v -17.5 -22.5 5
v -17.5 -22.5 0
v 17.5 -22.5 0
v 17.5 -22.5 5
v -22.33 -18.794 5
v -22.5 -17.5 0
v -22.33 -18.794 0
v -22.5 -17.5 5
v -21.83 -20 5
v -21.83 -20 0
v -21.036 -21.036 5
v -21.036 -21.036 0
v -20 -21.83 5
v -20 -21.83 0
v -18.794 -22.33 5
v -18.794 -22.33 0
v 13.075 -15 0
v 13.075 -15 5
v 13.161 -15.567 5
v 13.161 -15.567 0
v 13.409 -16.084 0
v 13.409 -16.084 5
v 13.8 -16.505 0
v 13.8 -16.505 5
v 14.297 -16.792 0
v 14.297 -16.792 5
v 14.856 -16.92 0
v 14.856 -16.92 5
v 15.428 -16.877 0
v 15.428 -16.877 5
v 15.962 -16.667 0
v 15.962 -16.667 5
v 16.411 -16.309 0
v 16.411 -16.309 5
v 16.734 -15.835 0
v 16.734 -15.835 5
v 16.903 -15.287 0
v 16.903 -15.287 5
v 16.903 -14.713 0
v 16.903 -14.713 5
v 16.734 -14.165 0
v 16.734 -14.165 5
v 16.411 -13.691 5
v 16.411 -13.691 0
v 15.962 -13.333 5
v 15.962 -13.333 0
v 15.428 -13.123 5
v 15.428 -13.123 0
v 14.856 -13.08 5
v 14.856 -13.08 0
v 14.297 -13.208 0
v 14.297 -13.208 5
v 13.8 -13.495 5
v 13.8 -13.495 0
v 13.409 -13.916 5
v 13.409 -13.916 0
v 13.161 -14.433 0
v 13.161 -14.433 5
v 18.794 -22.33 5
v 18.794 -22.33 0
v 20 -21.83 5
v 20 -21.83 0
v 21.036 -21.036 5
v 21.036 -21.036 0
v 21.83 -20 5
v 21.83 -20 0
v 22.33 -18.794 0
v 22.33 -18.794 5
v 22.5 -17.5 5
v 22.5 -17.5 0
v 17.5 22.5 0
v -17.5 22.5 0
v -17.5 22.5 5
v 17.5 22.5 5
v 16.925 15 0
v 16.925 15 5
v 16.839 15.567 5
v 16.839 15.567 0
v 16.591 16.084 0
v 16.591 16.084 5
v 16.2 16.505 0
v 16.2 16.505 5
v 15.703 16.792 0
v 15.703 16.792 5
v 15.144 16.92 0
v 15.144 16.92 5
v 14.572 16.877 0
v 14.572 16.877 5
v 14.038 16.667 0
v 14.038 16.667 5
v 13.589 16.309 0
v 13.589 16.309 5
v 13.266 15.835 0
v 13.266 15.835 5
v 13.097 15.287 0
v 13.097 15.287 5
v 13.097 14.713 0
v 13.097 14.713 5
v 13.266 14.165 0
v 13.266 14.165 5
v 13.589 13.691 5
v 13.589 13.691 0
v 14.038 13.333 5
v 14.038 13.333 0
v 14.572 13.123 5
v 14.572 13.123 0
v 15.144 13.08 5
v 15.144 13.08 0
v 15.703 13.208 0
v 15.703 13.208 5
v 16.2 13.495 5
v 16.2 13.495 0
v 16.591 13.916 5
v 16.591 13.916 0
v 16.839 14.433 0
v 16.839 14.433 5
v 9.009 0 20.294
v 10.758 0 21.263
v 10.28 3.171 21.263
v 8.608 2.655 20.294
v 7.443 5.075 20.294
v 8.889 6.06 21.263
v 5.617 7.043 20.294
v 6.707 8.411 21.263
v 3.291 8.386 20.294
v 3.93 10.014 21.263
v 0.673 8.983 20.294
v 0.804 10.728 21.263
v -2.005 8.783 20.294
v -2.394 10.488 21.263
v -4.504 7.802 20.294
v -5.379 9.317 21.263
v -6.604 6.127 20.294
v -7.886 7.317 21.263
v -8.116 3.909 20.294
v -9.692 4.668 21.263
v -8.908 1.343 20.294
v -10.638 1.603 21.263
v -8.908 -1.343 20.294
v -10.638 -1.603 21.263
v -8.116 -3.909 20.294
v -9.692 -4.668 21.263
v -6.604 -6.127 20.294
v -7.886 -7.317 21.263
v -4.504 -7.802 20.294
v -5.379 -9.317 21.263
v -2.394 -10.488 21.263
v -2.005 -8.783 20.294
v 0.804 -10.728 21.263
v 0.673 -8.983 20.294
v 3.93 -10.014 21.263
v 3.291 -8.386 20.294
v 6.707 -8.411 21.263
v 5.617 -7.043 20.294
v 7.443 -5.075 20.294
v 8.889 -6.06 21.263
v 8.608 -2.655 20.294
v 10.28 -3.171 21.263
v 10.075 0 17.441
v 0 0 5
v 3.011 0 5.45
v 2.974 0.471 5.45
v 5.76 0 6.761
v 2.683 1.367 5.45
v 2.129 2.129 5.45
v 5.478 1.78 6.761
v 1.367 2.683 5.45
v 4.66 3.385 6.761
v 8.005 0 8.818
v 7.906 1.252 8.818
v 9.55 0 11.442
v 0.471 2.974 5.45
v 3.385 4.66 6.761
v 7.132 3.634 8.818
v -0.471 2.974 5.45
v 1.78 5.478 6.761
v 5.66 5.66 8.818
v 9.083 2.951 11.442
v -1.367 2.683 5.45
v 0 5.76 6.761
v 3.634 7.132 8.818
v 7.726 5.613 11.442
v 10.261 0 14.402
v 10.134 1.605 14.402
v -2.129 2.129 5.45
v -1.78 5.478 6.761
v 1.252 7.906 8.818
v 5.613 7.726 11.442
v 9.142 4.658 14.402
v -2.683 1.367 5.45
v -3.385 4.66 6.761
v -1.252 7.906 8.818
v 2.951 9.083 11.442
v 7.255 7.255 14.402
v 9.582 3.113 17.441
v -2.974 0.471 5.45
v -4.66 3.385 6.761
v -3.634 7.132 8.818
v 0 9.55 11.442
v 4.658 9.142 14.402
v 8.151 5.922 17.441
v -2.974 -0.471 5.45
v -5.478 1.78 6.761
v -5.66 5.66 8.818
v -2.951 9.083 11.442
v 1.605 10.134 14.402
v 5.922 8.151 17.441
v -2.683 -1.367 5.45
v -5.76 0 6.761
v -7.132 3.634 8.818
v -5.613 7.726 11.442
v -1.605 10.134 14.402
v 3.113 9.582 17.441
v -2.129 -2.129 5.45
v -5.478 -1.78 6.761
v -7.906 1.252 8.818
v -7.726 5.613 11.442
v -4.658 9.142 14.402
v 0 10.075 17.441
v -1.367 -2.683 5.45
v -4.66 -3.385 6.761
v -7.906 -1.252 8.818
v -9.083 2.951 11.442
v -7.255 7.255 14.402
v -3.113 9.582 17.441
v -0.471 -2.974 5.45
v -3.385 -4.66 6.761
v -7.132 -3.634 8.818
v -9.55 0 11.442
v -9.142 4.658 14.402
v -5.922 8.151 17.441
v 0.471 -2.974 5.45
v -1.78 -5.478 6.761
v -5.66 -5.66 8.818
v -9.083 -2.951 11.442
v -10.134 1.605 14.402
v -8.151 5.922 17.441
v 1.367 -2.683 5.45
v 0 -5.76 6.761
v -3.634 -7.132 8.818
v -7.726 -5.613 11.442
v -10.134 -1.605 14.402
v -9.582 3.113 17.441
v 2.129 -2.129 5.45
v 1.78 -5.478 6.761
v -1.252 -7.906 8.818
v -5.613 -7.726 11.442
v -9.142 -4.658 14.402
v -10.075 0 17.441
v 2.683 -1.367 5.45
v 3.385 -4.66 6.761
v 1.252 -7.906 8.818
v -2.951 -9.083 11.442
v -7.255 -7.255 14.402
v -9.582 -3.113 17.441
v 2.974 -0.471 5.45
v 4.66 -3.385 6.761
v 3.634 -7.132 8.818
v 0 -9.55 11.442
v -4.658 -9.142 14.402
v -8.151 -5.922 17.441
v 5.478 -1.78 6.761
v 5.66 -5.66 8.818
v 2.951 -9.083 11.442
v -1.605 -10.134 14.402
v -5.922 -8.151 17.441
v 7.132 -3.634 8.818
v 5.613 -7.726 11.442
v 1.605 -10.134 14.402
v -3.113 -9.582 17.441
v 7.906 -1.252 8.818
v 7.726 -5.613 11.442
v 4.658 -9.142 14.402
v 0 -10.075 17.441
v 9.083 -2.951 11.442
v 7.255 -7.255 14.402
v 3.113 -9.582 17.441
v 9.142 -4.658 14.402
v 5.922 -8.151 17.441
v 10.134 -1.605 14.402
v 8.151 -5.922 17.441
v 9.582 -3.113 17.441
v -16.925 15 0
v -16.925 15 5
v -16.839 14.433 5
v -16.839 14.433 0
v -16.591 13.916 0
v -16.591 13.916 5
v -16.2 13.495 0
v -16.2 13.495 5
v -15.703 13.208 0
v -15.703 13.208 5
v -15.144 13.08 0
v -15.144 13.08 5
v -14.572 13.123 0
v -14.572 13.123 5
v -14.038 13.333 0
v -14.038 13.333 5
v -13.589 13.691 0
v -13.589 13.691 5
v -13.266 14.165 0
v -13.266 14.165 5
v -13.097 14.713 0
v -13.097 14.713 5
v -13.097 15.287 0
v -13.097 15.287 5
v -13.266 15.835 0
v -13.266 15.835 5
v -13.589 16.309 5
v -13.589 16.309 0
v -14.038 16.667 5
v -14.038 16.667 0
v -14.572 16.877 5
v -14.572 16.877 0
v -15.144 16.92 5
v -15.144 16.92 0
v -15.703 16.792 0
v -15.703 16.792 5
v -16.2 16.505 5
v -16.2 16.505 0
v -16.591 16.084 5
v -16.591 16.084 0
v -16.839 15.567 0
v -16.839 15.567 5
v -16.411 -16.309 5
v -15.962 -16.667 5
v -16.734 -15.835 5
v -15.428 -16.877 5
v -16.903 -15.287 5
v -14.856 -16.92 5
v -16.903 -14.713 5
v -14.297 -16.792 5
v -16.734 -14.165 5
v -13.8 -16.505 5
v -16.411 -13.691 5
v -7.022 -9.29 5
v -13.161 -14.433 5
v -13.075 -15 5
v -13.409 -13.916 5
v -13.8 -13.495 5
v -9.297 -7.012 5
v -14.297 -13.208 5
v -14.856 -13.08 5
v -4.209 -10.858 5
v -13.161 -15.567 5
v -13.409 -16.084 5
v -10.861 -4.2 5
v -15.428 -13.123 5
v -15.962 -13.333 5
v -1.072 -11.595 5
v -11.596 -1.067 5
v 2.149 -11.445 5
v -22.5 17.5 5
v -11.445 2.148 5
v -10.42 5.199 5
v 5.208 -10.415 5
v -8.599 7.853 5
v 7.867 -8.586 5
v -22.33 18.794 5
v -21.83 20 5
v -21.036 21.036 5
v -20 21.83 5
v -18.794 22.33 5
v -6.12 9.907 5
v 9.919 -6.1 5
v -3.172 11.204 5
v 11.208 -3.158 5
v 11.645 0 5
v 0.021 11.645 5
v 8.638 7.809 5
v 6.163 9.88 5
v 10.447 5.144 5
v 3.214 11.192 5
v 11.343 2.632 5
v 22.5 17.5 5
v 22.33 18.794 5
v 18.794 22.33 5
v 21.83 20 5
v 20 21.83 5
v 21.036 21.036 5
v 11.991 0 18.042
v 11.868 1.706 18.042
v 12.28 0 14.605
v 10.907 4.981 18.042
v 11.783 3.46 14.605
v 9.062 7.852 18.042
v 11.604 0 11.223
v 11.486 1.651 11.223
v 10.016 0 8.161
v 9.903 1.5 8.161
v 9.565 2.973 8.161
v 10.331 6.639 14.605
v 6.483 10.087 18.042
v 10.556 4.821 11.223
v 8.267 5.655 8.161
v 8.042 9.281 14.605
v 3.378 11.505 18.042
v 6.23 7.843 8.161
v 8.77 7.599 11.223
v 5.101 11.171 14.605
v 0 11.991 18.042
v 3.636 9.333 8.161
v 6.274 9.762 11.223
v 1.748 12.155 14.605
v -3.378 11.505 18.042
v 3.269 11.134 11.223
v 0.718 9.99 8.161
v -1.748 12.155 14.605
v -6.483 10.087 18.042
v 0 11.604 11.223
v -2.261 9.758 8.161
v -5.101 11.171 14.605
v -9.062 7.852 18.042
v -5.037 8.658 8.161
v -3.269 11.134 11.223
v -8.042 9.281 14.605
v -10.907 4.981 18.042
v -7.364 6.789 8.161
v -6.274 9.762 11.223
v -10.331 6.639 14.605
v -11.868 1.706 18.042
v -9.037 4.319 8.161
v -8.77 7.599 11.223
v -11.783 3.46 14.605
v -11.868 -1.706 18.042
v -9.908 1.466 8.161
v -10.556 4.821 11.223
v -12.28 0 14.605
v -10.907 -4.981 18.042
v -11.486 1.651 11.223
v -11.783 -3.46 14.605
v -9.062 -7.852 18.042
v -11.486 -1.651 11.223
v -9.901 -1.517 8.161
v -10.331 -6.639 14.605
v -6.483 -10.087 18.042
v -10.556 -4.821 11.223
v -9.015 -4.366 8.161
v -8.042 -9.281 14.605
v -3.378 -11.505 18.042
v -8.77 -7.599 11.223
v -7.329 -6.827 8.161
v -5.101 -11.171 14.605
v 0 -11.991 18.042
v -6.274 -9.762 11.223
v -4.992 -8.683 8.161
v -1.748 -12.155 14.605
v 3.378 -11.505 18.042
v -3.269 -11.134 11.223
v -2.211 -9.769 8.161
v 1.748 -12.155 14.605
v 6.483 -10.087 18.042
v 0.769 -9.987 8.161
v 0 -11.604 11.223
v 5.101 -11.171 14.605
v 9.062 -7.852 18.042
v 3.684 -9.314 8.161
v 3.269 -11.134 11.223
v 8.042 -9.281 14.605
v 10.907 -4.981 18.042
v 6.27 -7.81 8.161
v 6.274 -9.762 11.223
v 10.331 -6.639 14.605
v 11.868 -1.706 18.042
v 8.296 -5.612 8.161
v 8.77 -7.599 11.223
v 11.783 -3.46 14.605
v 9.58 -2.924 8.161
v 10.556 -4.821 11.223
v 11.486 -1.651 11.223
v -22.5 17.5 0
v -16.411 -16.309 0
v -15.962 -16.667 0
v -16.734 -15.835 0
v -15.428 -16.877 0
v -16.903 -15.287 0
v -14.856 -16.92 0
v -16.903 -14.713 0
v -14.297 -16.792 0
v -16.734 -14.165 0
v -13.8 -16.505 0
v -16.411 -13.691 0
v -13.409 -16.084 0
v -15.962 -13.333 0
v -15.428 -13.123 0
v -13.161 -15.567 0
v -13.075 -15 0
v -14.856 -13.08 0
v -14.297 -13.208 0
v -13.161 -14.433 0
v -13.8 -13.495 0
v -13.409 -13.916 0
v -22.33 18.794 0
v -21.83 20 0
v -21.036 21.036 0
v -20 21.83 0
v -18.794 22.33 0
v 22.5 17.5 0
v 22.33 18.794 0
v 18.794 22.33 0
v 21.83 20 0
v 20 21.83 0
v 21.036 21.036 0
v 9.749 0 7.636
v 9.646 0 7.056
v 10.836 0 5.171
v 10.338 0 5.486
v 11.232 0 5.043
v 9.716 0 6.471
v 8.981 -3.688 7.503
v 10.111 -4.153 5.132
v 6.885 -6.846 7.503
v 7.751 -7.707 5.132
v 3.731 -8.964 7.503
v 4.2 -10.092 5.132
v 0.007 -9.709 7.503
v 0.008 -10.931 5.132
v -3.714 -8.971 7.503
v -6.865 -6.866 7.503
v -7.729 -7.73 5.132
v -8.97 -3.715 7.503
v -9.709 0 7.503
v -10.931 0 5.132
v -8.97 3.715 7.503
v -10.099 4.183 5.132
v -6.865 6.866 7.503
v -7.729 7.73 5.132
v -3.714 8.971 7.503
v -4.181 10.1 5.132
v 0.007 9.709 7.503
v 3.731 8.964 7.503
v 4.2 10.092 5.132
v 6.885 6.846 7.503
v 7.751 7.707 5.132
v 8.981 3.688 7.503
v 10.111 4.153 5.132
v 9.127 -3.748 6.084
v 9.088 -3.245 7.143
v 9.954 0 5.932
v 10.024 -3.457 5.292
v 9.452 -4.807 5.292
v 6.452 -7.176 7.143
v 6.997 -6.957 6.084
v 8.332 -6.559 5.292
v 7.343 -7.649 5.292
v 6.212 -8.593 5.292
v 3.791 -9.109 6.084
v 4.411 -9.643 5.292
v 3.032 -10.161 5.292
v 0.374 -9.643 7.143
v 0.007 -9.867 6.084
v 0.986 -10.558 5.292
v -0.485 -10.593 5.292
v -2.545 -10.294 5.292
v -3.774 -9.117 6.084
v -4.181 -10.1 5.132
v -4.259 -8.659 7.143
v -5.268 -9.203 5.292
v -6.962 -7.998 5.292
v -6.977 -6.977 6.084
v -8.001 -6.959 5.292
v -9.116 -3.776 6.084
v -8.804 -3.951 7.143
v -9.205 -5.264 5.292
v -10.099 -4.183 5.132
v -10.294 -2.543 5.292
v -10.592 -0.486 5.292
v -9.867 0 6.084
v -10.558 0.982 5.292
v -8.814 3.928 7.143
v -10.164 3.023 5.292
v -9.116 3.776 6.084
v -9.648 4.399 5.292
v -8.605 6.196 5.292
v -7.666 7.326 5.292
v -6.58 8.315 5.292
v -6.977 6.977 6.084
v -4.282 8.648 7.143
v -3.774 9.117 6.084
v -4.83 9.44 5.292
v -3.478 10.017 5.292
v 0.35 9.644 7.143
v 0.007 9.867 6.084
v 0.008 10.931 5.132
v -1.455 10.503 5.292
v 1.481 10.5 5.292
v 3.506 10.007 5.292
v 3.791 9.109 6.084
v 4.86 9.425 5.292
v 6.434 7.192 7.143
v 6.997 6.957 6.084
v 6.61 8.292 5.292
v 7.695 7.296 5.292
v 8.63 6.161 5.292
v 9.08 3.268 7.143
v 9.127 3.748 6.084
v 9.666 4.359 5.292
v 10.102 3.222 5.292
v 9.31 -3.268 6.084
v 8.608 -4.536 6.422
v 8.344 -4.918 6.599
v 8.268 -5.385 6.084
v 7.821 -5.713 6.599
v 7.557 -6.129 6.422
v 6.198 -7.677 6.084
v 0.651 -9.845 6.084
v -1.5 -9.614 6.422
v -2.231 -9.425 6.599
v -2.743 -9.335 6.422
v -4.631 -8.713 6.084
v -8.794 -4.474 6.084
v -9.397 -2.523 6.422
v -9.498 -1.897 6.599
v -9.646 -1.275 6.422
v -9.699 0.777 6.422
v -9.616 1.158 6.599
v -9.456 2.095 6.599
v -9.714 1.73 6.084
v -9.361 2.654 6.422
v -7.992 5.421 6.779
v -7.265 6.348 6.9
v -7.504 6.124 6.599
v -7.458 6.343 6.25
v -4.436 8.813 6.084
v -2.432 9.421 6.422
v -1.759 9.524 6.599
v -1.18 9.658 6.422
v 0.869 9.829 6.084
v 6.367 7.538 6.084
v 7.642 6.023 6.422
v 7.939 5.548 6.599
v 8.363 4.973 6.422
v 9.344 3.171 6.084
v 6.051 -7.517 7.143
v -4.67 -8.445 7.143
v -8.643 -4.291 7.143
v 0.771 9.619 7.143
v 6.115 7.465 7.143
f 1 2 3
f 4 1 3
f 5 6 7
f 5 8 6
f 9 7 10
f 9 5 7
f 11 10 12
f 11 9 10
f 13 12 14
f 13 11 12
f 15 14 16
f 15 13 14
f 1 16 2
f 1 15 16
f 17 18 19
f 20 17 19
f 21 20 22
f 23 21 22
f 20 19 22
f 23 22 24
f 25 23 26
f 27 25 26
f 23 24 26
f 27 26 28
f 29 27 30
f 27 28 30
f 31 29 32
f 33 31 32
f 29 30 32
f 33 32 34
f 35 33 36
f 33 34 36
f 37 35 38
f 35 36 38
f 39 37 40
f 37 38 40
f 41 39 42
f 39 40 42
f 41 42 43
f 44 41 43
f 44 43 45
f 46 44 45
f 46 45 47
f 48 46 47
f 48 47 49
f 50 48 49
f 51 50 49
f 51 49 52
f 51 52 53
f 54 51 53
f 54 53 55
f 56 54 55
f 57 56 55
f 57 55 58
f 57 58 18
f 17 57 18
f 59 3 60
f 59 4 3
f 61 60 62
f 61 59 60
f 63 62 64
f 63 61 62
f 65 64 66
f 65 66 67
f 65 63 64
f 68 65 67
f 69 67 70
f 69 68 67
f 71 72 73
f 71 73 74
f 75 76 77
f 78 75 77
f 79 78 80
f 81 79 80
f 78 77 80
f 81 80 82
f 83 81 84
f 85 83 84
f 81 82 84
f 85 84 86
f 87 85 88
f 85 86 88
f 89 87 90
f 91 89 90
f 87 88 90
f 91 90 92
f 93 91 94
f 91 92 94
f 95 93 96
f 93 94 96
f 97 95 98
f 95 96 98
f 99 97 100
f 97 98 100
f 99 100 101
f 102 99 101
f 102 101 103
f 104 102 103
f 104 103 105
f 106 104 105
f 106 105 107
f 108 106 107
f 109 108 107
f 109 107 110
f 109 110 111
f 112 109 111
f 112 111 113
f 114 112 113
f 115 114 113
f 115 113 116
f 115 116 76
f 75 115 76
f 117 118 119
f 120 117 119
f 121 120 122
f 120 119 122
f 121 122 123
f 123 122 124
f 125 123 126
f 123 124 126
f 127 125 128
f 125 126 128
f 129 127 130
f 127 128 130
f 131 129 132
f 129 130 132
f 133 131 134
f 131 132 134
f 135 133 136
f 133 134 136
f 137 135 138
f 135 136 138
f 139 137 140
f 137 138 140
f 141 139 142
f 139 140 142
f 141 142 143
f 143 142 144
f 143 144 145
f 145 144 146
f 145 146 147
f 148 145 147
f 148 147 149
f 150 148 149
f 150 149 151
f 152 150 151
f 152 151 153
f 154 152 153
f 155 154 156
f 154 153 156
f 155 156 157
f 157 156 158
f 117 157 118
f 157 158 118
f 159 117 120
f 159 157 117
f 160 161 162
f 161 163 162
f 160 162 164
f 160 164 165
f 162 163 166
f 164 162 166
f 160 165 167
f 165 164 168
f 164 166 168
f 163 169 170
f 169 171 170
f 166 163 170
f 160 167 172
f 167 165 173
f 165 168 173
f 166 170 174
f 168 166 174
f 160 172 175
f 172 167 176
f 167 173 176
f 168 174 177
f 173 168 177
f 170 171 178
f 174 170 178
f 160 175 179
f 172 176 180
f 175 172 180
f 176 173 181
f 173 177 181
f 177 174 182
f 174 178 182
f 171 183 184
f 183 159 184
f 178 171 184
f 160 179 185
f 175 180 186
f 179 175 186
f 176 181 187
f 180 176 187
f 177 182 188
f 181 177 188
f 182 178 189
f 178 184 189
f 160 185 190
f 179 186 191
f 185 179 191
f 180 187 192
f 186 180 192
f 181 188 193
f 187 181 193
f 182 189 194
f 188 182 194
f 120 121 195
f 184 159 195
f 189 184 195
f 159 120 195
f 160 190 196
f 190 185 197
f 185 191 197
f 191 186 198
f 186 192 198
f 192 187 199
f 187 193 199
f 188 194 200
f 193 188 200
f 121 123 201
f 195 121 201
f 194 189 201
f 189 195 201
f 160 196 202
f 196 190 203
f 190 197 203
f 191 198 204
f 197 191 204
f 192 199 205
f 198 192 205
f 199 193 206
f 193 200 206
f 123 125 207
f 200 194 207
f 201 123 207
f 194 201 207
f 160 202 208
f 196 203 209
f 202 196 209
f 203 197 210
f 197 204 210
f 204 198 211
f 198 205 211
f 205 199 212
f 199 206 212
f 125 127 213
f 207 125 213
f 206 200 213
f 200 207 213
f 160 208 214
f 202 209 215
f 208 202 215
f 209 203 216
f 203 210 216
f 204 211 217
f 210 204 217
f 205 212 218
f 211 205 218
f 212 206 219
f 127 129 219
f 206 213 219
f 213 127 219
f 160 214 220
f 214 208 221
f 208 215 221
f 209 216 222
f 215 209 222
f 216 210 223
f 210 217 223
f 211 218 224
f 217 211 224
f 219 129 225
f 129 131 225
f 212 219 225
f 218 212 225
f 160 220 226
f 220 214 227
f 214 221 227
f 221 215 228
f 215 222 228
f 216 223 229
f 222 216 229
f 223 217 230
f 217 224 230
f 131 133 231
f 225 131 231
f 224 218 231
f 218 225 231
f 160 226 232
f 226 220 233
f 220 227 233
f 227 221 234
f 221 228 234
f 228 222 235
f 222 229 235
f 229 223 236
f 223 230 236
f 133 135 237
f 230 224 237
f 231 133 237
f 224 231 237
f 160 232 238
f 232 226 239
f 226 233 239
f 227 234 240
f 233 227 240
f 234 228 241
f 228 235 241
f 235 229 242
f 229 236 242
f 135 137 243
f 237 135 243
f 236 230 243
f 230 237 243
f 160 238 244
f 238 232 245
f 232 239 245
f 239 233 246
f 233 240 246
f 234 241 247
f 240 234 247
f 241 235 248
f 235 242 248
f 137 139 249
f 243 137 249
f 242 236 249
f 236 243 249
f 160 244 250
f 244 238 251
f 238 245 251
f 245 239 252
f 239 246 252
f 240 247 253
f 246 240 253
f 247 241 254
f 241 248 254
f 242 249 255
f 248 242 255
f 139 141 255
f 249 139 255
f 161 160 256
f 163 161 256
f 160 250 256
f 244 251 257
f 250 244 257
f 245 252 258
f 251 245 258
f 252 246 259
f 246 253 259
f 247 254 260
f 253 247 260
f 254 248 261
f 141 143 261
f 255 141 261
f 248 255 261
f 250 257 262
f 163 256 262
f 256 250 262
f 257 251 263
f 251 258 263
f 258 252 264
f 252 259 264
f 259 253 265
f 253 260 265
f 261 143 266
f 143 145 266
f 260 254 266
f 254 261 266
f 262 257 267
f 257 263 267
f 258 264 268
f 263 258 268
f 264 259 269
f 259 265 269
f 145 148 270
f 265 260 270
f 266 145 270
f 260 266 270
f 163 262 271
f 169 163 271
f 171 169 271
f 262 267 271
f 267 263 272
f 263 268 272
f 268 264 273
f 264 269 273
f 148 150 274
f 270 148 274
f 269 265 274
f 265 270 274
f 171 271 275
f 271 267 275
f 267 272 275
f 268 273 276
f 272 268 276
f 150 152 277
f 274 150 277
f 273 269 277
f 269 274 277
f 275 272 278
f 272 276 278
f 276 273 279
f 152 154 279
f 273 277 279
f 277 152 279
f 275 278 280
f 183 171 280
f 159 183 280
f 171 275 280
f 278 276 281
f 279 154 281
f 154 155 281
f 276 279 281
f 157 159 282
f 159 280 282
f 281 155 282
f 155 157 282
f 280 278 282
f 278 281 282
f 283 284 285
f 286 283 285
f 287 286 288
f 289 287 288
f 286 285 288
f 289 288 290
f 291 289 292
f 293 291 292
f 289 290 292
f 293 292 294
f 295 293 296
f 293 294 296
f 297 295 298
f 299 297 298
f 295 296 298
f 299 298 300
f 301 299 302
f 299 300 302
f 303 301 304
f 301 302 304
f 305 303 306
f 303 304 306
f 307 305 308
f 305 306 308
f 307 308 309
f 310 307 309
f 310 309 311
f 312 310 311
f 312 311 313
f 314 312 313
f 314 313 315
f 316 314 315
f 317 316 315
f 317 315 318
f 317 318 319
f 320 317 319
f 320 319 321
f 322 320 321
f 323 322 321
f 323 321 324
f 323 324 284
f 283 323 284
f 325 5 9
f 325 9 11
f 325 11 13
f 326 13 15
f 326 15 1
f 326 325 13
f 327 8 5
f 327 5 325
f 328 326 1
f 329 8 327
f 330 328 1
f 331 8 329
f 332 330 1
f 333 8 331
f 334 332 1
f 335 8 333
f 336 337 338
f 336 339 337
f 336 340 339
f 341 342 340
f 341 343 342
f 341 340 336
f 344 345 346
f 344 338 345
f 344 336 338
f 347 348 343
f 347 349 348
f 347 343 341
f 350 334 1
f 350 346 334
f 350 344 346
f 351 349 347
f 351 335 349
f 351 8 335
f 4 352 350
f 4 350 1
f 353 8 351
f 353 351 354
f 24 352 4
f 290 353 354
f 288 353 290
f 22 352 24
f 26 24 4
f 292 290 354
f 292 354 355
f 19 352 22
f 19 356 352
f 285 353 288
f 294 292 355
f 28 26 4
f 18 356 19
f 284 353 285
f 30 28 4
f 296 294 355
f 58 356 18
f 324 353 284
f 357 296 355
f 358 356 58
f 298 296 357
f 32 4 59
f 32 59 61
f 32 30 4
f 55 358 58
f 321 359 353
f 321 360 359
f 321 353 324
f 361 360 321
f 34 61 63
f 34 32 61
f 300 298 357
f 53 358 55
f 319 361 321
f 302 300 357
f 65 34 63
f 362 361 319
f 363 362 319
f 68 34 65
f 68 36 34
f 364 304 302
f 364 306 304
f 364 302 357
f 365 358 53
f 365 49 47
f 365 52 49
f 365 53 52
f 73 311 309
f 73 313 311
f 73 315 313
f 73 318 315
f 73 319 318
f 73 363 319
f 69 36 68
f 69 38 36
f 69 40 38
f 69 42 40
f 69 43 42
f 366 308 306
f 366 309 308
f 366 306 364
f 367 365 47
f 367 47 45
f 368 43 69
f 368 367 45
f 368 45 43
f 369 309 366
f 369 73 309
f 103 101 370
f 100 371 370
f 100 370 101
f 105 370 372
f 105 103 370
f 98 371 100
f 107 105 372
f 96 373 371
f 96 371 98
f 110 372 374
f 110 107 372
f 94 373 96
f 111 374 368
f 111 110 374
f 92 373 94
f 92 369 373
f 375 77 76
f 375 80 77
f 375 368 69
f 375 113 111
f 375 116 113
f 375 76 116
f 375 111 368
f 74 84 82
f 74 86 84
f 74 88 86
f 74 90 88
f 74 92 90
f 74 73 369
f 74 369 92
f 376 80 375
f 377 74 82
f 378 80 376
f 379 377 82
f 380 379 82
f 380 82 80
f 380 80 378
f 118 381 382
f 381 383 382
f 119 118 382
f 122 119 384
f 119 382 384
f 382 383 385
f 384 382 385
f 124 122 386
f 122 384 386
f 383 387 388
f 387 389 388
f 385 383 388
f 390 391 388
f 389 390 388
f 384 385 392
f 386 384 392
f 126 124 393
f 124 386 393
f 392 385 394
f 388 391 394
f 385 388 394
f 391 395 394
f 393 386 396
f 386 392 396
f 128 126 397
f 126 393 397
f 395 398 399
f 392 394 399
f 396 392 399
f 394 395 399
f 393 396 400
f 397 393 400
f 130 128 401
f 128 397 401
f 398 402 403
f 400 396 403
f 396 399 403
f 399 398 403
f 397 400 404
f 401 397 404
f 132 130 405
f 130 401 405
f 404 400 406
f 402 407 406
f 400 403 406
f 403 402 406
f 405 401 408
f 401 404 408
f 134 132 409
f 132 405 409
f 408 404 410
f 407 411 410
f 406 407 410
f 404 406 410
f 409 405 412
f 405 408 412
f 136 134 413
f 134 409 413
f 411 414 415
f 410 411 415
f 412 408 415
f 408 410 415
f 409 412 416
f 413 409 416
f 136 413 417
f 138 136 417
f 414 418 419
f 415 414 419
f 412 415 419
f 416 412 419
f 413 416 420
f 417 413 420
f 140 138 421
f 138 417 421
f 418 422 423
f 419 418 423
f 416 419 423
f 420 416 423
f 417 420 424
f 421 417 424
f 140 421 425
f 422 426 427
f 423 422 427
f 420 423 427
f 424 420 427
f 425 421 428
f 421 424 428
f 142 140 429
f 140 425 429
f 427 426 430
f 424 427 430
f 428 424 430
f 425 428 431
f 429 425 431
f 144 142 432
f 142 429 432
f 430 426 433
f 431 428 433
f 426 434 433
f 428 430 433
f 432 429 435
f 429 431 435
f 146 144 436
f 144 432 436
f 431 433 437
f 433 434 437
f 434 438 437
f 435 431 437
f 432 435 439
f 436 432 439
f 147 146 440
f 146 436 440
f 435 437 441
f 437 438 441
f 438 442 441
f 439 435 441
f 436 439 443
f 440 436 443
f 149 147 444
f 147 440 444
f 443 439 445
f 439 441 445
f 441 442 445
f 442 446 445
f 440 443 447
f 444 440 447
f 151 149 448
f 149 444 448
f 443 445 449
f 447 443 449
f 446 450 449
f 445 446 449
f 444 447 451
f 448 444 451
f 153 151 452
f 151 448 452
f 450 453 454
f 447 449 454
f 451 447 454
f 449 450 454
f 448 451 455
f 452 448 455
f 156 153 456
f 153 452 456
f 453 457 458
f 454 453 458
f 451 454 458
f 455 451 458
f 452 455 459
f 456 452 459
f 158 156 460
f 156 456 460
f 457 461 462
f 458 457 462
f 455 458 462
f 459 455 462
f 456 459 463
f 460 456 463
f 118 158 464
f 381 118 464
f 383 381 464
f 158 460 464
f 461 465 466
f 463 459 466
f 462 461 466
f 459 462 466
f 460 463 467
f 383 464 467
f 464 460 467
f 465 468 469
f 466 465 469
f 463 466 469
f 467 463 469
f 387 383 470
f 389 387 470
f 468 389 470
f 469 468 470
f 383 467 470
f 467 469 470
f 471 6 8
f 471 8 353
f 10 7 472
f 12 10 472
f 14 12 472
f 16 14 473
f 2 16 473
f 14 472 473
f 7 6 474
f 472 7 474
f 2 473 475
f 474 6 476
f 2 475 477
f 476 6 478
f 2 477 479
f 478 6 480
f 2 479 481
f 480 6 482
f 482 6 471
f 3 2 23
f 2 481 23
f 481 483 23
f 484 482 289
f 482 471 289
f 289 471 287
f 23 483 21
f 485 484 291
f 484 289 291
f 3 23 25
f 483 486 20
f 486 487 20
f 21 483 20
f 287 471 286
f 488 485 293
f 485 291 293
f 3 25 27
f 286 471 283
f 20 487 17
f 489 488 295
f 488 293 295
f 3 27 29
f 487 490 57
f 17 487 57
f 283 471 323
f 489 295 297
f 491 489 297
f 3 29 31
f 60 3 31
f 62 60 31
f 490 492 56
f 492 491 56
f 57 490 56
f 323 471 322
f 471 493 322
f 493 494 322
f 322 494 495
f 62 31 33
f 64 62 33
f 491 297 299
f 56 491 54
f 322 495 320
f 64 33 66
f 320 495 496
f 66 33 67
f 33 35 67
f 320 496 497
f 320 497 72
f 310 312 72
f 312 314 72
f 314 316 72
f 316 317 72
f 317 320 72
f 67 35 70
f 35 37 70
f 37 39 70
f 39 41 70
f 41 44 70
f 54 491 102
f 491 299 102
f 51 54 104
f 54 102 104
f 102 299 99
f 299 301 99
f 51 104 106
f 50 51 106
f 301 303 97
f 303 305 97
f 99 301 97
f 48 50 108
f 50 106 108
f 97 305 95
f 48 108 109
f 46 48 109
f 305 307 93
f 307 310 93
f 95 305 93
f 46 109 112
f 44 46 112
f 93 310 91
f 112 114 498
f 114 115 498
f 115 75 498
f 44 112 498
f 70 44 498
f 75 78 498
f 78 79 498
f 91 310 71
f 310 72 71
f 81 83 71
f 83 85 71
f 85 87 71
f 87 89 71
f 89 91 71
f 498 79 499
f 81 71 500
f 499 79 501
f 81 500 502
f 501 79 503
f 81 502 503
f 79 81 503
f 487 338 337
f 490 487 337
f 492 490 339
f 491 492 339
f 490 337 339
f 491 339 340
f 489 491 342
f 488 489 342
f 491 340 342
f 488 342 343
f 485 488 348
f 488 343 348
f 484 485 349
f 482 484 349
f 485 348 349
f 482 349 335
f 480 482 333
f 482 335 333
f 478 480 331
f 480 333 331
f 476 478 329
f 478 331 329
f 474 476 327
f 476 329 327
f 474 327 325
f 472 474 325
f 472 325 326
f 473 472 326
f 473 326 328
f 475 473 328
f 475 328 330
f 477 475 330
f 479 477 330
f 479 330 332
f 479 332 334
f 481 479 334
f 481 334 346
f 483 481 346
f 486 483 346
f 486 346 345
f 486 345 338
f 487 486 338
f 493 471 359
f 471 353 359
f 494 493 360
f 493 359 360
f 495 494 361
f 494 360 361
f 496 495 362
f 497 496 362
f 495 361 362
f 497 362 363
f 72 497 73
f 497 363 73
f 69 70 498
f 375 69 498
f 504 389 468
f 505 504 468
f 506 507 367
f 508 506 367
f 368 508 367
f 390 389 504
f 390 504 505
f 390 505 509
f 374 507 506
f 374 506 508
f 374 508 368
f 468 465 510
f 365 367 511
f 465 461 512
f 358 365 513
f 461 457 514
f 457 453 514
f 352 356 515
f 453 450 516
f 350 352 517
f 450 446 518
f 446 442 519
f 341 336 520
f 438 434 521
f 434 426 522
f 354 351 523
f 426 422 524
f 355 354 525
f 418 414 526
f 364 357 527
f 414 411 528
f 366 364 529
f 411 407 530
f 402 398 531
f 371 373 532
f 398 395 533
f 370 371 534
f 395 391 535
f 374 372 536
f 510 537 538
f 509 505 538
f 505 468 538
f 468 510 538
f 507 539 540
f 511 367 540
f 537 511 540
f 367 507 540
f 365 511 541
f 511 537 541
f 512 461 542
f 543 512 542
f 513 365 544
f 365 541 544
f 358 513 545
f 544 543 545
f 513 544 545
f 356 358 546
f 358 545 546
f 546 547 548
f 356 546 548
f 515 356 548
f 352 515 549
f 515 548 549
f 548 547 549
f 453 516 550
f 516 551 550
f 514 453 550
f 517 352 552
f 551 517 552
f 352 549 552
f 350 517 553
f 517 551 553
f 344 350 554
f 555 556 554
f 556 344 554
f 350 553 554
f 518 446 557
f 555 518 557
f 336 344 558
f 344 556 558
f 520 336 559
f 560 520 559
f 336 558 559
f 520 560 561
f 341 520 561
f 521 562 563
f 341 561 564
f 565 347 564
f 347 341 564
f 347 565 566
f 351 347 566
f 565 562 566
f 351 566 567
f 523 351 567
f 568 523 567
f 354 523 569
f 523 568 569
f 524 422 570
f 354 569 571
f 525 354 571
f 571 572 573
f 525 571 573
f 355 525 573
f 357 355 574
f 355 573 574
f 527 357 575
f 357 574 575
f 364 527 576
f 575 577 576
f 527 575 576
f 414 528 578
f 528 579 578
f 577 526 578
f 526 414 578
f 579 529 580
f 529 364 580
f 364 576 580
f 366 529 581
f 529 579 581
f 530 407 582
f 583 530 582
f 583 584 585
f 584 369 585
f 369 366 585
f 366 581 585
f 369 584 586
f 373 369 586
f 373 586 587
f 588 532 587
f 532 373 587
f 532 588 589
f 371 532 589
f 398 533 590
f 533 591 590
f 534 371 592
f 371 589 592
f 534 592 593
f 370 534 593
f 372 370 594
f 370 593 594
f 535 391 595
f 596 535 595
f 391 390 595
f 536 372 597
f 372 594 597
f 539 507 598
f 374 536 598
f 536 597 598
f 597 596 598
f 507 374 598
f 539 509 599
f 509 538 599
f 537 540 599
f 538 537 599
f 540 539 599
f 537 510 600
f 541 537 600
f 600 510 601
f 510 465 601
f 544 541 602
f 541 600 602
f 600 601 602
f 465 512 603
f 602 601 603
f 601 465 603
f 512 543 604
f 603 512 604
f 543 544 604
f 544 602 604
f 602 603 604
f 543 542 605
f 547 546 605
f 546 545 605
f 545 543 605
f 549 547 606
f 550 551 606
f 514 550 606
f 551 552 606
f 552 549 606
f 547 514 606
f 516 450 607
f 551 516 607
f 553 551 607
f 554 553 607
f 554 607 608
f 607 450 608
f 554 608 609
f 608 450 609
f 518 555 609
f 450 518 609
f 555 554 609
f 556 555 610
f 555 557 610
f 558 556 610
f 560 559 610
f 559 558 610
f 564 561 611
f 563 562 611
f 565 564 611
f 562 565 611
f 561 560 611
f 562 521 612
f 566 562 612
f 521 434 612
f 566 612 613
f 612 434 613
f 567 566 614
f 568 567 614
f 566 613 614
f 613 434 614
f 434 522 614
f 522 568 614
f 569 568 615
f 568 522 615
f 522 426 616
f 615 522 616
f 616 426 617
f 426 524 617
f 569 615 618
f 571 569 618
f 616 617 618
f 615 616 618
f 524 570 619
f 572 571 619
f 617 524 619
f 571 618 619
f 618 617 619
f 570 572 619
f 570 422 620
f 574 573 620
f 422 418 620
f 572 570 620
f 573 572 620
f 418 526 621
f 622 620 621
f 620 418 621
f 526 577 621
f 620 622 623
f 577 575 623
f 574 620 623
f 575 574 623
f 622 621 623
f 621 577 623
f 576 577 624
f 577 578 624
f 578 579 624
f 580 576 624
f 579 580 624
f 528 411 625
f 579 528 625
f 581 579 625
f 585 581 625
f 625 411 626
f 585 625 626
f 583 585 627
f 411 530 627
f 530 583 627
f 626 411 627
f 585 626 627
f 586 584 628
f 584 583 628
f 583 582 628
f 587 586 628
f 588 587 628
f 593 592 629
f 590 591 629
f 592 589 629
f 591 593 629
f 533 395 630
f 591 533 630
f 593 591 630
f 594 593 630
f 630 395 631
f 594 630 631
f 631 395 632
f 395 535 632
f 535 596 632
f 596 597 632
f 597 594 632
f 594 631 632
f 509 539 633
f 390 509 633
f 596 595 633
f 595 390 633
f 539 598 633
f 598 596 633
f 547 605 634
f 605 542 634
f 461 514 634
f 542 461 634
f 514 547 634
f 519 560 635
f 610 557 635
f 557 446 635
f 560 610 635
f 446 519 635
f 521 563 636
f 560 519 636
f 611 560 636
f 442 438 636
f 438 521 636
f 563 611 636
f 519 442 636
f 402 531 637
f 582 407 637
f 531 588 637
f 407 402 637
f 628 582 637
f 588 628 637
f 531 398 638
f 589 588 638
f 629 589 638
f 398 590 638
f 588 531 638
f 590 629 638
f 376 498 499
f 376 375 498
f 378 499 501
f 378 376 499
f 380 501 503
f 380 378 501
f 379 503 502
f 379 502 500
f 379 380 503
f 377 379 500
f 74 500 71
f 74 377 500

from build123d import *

# Parameters (mm, degrees)
SKETCH1_W           = 45
SKETCH1_H           = 45
BOSS_EXTRUDE1_DEPTH = 5
FILLET1_R           = 5
SKETCH2_R           = 1.925
CUT_EXTRUDE1_DEPTH  = 33.210246817
FILLET2_R           = 2


with BuildPart() as part:
    # Sketch1 → Boss-Extrude1 (new body)
    with BuildSketch(Plane.XY):
        Rectangle(SKETCH1_W, SKETCH1_H)
    extrude(amount=BOSS_EXTRUDE1_DEPTH)

    # Fillet1
    fillet1_edges = [part.edges().sort_by_distance(p)[0] for p in [
        (22.5, -22.5, 2.5),
        (-22.5, -22.5, 2.5),
        (-22.5, 22.5, 2.5),
        (22.5, 22.5, 2.5),
    ]]
    fillet(fillet1_edges, radius=FILLET1_R)

    # Sketch2 → Cut-Extrude1 (cut, through all)
    with BuildSketch(Plane.XY.offset(5)):
        with Locations((15, 15)):
            Circle(SKETCH2_R)
        with Locations(Location((15, -15, 0), (0, 0, 180))):
            Circle(SKETCH2_R)
        with Locations((-15, -15)):
            Circle(SKETCH2_R)
        with Locations(Location((-15, 15, 0), (0, 0, 180))):
            Circle(SKETCH2_R)
    extrude(amount=-CUT_EXTRUDE1_DEPTH, mode=Mode.SUBTRACT)

    # Sketch3 → Revolve5 (revolve)
    with BuildSketch(Plane(origin=(0, 0, 0), x_dir=(1, 0, 0), z_dir=(0, 1, 0))):
        with BuildLine():
            Line((0, -3), (0, -5))
            ThreePointArc((0, -5), (10.3, -15.3), (0, -25.6))
            Line((0, -25.6), (0, -27.6))
            ThreePointArc((0, -27.6), (12.3, -15.3), (0, -3))
        make_face()
    revolve(axis=Axis((0, 0, 3), (0, 0, 1)))

    # Fillet2
    fillet2_edges = [part.edges().sort_by_distance(p)[0] for p in [
        (-6.723094526, 0, 5),
    ]]
    fillet(fillet2_edges, radius=FILLET2_R)

    # Cut-Revolve9: read off the stored shape, not the designer's step
    # Cut-Revolve9 outline → Cut-Revolve9 (revolve, cut)
    with BuildSketch(Plane.XZ):
        Polygon((9.008582984, 21.263158329), (9.008582984, 20.293539089), (10.757822398, 21.263158329), align=None)
    revolve(axis=Axis((0, 0, 0), (0, 0, 1)), mode=Mode.SUBTRACT)

    # Cut-Revolve9 2 outline → Cut-Revolve9 2 (revolve, cut)
    with BuildSketch(Plane.XZ):
        with BuildLine():
            Line((9.008582984, 21.263158329), (10.757822401, 21.263158323))
            ThreePointArc((10.757822401, 21.263158323), (6.242721867, 25.898038672), (0, 27.6))
            Line((0, 27.6), (0, 25.6))
            ThreePointArc((0, 25.6), (5.227645138, 24.174780353), (9.008582983, 20.293539089))
            Line((9.008582983, 20.293539089), (9.008582984, 21.263158329))
        make_face()
    revolve(axis=Axis((0, 0, 0), (0, 0, 1)), mode=Mode.SUBTRACT)


solid = part.part
